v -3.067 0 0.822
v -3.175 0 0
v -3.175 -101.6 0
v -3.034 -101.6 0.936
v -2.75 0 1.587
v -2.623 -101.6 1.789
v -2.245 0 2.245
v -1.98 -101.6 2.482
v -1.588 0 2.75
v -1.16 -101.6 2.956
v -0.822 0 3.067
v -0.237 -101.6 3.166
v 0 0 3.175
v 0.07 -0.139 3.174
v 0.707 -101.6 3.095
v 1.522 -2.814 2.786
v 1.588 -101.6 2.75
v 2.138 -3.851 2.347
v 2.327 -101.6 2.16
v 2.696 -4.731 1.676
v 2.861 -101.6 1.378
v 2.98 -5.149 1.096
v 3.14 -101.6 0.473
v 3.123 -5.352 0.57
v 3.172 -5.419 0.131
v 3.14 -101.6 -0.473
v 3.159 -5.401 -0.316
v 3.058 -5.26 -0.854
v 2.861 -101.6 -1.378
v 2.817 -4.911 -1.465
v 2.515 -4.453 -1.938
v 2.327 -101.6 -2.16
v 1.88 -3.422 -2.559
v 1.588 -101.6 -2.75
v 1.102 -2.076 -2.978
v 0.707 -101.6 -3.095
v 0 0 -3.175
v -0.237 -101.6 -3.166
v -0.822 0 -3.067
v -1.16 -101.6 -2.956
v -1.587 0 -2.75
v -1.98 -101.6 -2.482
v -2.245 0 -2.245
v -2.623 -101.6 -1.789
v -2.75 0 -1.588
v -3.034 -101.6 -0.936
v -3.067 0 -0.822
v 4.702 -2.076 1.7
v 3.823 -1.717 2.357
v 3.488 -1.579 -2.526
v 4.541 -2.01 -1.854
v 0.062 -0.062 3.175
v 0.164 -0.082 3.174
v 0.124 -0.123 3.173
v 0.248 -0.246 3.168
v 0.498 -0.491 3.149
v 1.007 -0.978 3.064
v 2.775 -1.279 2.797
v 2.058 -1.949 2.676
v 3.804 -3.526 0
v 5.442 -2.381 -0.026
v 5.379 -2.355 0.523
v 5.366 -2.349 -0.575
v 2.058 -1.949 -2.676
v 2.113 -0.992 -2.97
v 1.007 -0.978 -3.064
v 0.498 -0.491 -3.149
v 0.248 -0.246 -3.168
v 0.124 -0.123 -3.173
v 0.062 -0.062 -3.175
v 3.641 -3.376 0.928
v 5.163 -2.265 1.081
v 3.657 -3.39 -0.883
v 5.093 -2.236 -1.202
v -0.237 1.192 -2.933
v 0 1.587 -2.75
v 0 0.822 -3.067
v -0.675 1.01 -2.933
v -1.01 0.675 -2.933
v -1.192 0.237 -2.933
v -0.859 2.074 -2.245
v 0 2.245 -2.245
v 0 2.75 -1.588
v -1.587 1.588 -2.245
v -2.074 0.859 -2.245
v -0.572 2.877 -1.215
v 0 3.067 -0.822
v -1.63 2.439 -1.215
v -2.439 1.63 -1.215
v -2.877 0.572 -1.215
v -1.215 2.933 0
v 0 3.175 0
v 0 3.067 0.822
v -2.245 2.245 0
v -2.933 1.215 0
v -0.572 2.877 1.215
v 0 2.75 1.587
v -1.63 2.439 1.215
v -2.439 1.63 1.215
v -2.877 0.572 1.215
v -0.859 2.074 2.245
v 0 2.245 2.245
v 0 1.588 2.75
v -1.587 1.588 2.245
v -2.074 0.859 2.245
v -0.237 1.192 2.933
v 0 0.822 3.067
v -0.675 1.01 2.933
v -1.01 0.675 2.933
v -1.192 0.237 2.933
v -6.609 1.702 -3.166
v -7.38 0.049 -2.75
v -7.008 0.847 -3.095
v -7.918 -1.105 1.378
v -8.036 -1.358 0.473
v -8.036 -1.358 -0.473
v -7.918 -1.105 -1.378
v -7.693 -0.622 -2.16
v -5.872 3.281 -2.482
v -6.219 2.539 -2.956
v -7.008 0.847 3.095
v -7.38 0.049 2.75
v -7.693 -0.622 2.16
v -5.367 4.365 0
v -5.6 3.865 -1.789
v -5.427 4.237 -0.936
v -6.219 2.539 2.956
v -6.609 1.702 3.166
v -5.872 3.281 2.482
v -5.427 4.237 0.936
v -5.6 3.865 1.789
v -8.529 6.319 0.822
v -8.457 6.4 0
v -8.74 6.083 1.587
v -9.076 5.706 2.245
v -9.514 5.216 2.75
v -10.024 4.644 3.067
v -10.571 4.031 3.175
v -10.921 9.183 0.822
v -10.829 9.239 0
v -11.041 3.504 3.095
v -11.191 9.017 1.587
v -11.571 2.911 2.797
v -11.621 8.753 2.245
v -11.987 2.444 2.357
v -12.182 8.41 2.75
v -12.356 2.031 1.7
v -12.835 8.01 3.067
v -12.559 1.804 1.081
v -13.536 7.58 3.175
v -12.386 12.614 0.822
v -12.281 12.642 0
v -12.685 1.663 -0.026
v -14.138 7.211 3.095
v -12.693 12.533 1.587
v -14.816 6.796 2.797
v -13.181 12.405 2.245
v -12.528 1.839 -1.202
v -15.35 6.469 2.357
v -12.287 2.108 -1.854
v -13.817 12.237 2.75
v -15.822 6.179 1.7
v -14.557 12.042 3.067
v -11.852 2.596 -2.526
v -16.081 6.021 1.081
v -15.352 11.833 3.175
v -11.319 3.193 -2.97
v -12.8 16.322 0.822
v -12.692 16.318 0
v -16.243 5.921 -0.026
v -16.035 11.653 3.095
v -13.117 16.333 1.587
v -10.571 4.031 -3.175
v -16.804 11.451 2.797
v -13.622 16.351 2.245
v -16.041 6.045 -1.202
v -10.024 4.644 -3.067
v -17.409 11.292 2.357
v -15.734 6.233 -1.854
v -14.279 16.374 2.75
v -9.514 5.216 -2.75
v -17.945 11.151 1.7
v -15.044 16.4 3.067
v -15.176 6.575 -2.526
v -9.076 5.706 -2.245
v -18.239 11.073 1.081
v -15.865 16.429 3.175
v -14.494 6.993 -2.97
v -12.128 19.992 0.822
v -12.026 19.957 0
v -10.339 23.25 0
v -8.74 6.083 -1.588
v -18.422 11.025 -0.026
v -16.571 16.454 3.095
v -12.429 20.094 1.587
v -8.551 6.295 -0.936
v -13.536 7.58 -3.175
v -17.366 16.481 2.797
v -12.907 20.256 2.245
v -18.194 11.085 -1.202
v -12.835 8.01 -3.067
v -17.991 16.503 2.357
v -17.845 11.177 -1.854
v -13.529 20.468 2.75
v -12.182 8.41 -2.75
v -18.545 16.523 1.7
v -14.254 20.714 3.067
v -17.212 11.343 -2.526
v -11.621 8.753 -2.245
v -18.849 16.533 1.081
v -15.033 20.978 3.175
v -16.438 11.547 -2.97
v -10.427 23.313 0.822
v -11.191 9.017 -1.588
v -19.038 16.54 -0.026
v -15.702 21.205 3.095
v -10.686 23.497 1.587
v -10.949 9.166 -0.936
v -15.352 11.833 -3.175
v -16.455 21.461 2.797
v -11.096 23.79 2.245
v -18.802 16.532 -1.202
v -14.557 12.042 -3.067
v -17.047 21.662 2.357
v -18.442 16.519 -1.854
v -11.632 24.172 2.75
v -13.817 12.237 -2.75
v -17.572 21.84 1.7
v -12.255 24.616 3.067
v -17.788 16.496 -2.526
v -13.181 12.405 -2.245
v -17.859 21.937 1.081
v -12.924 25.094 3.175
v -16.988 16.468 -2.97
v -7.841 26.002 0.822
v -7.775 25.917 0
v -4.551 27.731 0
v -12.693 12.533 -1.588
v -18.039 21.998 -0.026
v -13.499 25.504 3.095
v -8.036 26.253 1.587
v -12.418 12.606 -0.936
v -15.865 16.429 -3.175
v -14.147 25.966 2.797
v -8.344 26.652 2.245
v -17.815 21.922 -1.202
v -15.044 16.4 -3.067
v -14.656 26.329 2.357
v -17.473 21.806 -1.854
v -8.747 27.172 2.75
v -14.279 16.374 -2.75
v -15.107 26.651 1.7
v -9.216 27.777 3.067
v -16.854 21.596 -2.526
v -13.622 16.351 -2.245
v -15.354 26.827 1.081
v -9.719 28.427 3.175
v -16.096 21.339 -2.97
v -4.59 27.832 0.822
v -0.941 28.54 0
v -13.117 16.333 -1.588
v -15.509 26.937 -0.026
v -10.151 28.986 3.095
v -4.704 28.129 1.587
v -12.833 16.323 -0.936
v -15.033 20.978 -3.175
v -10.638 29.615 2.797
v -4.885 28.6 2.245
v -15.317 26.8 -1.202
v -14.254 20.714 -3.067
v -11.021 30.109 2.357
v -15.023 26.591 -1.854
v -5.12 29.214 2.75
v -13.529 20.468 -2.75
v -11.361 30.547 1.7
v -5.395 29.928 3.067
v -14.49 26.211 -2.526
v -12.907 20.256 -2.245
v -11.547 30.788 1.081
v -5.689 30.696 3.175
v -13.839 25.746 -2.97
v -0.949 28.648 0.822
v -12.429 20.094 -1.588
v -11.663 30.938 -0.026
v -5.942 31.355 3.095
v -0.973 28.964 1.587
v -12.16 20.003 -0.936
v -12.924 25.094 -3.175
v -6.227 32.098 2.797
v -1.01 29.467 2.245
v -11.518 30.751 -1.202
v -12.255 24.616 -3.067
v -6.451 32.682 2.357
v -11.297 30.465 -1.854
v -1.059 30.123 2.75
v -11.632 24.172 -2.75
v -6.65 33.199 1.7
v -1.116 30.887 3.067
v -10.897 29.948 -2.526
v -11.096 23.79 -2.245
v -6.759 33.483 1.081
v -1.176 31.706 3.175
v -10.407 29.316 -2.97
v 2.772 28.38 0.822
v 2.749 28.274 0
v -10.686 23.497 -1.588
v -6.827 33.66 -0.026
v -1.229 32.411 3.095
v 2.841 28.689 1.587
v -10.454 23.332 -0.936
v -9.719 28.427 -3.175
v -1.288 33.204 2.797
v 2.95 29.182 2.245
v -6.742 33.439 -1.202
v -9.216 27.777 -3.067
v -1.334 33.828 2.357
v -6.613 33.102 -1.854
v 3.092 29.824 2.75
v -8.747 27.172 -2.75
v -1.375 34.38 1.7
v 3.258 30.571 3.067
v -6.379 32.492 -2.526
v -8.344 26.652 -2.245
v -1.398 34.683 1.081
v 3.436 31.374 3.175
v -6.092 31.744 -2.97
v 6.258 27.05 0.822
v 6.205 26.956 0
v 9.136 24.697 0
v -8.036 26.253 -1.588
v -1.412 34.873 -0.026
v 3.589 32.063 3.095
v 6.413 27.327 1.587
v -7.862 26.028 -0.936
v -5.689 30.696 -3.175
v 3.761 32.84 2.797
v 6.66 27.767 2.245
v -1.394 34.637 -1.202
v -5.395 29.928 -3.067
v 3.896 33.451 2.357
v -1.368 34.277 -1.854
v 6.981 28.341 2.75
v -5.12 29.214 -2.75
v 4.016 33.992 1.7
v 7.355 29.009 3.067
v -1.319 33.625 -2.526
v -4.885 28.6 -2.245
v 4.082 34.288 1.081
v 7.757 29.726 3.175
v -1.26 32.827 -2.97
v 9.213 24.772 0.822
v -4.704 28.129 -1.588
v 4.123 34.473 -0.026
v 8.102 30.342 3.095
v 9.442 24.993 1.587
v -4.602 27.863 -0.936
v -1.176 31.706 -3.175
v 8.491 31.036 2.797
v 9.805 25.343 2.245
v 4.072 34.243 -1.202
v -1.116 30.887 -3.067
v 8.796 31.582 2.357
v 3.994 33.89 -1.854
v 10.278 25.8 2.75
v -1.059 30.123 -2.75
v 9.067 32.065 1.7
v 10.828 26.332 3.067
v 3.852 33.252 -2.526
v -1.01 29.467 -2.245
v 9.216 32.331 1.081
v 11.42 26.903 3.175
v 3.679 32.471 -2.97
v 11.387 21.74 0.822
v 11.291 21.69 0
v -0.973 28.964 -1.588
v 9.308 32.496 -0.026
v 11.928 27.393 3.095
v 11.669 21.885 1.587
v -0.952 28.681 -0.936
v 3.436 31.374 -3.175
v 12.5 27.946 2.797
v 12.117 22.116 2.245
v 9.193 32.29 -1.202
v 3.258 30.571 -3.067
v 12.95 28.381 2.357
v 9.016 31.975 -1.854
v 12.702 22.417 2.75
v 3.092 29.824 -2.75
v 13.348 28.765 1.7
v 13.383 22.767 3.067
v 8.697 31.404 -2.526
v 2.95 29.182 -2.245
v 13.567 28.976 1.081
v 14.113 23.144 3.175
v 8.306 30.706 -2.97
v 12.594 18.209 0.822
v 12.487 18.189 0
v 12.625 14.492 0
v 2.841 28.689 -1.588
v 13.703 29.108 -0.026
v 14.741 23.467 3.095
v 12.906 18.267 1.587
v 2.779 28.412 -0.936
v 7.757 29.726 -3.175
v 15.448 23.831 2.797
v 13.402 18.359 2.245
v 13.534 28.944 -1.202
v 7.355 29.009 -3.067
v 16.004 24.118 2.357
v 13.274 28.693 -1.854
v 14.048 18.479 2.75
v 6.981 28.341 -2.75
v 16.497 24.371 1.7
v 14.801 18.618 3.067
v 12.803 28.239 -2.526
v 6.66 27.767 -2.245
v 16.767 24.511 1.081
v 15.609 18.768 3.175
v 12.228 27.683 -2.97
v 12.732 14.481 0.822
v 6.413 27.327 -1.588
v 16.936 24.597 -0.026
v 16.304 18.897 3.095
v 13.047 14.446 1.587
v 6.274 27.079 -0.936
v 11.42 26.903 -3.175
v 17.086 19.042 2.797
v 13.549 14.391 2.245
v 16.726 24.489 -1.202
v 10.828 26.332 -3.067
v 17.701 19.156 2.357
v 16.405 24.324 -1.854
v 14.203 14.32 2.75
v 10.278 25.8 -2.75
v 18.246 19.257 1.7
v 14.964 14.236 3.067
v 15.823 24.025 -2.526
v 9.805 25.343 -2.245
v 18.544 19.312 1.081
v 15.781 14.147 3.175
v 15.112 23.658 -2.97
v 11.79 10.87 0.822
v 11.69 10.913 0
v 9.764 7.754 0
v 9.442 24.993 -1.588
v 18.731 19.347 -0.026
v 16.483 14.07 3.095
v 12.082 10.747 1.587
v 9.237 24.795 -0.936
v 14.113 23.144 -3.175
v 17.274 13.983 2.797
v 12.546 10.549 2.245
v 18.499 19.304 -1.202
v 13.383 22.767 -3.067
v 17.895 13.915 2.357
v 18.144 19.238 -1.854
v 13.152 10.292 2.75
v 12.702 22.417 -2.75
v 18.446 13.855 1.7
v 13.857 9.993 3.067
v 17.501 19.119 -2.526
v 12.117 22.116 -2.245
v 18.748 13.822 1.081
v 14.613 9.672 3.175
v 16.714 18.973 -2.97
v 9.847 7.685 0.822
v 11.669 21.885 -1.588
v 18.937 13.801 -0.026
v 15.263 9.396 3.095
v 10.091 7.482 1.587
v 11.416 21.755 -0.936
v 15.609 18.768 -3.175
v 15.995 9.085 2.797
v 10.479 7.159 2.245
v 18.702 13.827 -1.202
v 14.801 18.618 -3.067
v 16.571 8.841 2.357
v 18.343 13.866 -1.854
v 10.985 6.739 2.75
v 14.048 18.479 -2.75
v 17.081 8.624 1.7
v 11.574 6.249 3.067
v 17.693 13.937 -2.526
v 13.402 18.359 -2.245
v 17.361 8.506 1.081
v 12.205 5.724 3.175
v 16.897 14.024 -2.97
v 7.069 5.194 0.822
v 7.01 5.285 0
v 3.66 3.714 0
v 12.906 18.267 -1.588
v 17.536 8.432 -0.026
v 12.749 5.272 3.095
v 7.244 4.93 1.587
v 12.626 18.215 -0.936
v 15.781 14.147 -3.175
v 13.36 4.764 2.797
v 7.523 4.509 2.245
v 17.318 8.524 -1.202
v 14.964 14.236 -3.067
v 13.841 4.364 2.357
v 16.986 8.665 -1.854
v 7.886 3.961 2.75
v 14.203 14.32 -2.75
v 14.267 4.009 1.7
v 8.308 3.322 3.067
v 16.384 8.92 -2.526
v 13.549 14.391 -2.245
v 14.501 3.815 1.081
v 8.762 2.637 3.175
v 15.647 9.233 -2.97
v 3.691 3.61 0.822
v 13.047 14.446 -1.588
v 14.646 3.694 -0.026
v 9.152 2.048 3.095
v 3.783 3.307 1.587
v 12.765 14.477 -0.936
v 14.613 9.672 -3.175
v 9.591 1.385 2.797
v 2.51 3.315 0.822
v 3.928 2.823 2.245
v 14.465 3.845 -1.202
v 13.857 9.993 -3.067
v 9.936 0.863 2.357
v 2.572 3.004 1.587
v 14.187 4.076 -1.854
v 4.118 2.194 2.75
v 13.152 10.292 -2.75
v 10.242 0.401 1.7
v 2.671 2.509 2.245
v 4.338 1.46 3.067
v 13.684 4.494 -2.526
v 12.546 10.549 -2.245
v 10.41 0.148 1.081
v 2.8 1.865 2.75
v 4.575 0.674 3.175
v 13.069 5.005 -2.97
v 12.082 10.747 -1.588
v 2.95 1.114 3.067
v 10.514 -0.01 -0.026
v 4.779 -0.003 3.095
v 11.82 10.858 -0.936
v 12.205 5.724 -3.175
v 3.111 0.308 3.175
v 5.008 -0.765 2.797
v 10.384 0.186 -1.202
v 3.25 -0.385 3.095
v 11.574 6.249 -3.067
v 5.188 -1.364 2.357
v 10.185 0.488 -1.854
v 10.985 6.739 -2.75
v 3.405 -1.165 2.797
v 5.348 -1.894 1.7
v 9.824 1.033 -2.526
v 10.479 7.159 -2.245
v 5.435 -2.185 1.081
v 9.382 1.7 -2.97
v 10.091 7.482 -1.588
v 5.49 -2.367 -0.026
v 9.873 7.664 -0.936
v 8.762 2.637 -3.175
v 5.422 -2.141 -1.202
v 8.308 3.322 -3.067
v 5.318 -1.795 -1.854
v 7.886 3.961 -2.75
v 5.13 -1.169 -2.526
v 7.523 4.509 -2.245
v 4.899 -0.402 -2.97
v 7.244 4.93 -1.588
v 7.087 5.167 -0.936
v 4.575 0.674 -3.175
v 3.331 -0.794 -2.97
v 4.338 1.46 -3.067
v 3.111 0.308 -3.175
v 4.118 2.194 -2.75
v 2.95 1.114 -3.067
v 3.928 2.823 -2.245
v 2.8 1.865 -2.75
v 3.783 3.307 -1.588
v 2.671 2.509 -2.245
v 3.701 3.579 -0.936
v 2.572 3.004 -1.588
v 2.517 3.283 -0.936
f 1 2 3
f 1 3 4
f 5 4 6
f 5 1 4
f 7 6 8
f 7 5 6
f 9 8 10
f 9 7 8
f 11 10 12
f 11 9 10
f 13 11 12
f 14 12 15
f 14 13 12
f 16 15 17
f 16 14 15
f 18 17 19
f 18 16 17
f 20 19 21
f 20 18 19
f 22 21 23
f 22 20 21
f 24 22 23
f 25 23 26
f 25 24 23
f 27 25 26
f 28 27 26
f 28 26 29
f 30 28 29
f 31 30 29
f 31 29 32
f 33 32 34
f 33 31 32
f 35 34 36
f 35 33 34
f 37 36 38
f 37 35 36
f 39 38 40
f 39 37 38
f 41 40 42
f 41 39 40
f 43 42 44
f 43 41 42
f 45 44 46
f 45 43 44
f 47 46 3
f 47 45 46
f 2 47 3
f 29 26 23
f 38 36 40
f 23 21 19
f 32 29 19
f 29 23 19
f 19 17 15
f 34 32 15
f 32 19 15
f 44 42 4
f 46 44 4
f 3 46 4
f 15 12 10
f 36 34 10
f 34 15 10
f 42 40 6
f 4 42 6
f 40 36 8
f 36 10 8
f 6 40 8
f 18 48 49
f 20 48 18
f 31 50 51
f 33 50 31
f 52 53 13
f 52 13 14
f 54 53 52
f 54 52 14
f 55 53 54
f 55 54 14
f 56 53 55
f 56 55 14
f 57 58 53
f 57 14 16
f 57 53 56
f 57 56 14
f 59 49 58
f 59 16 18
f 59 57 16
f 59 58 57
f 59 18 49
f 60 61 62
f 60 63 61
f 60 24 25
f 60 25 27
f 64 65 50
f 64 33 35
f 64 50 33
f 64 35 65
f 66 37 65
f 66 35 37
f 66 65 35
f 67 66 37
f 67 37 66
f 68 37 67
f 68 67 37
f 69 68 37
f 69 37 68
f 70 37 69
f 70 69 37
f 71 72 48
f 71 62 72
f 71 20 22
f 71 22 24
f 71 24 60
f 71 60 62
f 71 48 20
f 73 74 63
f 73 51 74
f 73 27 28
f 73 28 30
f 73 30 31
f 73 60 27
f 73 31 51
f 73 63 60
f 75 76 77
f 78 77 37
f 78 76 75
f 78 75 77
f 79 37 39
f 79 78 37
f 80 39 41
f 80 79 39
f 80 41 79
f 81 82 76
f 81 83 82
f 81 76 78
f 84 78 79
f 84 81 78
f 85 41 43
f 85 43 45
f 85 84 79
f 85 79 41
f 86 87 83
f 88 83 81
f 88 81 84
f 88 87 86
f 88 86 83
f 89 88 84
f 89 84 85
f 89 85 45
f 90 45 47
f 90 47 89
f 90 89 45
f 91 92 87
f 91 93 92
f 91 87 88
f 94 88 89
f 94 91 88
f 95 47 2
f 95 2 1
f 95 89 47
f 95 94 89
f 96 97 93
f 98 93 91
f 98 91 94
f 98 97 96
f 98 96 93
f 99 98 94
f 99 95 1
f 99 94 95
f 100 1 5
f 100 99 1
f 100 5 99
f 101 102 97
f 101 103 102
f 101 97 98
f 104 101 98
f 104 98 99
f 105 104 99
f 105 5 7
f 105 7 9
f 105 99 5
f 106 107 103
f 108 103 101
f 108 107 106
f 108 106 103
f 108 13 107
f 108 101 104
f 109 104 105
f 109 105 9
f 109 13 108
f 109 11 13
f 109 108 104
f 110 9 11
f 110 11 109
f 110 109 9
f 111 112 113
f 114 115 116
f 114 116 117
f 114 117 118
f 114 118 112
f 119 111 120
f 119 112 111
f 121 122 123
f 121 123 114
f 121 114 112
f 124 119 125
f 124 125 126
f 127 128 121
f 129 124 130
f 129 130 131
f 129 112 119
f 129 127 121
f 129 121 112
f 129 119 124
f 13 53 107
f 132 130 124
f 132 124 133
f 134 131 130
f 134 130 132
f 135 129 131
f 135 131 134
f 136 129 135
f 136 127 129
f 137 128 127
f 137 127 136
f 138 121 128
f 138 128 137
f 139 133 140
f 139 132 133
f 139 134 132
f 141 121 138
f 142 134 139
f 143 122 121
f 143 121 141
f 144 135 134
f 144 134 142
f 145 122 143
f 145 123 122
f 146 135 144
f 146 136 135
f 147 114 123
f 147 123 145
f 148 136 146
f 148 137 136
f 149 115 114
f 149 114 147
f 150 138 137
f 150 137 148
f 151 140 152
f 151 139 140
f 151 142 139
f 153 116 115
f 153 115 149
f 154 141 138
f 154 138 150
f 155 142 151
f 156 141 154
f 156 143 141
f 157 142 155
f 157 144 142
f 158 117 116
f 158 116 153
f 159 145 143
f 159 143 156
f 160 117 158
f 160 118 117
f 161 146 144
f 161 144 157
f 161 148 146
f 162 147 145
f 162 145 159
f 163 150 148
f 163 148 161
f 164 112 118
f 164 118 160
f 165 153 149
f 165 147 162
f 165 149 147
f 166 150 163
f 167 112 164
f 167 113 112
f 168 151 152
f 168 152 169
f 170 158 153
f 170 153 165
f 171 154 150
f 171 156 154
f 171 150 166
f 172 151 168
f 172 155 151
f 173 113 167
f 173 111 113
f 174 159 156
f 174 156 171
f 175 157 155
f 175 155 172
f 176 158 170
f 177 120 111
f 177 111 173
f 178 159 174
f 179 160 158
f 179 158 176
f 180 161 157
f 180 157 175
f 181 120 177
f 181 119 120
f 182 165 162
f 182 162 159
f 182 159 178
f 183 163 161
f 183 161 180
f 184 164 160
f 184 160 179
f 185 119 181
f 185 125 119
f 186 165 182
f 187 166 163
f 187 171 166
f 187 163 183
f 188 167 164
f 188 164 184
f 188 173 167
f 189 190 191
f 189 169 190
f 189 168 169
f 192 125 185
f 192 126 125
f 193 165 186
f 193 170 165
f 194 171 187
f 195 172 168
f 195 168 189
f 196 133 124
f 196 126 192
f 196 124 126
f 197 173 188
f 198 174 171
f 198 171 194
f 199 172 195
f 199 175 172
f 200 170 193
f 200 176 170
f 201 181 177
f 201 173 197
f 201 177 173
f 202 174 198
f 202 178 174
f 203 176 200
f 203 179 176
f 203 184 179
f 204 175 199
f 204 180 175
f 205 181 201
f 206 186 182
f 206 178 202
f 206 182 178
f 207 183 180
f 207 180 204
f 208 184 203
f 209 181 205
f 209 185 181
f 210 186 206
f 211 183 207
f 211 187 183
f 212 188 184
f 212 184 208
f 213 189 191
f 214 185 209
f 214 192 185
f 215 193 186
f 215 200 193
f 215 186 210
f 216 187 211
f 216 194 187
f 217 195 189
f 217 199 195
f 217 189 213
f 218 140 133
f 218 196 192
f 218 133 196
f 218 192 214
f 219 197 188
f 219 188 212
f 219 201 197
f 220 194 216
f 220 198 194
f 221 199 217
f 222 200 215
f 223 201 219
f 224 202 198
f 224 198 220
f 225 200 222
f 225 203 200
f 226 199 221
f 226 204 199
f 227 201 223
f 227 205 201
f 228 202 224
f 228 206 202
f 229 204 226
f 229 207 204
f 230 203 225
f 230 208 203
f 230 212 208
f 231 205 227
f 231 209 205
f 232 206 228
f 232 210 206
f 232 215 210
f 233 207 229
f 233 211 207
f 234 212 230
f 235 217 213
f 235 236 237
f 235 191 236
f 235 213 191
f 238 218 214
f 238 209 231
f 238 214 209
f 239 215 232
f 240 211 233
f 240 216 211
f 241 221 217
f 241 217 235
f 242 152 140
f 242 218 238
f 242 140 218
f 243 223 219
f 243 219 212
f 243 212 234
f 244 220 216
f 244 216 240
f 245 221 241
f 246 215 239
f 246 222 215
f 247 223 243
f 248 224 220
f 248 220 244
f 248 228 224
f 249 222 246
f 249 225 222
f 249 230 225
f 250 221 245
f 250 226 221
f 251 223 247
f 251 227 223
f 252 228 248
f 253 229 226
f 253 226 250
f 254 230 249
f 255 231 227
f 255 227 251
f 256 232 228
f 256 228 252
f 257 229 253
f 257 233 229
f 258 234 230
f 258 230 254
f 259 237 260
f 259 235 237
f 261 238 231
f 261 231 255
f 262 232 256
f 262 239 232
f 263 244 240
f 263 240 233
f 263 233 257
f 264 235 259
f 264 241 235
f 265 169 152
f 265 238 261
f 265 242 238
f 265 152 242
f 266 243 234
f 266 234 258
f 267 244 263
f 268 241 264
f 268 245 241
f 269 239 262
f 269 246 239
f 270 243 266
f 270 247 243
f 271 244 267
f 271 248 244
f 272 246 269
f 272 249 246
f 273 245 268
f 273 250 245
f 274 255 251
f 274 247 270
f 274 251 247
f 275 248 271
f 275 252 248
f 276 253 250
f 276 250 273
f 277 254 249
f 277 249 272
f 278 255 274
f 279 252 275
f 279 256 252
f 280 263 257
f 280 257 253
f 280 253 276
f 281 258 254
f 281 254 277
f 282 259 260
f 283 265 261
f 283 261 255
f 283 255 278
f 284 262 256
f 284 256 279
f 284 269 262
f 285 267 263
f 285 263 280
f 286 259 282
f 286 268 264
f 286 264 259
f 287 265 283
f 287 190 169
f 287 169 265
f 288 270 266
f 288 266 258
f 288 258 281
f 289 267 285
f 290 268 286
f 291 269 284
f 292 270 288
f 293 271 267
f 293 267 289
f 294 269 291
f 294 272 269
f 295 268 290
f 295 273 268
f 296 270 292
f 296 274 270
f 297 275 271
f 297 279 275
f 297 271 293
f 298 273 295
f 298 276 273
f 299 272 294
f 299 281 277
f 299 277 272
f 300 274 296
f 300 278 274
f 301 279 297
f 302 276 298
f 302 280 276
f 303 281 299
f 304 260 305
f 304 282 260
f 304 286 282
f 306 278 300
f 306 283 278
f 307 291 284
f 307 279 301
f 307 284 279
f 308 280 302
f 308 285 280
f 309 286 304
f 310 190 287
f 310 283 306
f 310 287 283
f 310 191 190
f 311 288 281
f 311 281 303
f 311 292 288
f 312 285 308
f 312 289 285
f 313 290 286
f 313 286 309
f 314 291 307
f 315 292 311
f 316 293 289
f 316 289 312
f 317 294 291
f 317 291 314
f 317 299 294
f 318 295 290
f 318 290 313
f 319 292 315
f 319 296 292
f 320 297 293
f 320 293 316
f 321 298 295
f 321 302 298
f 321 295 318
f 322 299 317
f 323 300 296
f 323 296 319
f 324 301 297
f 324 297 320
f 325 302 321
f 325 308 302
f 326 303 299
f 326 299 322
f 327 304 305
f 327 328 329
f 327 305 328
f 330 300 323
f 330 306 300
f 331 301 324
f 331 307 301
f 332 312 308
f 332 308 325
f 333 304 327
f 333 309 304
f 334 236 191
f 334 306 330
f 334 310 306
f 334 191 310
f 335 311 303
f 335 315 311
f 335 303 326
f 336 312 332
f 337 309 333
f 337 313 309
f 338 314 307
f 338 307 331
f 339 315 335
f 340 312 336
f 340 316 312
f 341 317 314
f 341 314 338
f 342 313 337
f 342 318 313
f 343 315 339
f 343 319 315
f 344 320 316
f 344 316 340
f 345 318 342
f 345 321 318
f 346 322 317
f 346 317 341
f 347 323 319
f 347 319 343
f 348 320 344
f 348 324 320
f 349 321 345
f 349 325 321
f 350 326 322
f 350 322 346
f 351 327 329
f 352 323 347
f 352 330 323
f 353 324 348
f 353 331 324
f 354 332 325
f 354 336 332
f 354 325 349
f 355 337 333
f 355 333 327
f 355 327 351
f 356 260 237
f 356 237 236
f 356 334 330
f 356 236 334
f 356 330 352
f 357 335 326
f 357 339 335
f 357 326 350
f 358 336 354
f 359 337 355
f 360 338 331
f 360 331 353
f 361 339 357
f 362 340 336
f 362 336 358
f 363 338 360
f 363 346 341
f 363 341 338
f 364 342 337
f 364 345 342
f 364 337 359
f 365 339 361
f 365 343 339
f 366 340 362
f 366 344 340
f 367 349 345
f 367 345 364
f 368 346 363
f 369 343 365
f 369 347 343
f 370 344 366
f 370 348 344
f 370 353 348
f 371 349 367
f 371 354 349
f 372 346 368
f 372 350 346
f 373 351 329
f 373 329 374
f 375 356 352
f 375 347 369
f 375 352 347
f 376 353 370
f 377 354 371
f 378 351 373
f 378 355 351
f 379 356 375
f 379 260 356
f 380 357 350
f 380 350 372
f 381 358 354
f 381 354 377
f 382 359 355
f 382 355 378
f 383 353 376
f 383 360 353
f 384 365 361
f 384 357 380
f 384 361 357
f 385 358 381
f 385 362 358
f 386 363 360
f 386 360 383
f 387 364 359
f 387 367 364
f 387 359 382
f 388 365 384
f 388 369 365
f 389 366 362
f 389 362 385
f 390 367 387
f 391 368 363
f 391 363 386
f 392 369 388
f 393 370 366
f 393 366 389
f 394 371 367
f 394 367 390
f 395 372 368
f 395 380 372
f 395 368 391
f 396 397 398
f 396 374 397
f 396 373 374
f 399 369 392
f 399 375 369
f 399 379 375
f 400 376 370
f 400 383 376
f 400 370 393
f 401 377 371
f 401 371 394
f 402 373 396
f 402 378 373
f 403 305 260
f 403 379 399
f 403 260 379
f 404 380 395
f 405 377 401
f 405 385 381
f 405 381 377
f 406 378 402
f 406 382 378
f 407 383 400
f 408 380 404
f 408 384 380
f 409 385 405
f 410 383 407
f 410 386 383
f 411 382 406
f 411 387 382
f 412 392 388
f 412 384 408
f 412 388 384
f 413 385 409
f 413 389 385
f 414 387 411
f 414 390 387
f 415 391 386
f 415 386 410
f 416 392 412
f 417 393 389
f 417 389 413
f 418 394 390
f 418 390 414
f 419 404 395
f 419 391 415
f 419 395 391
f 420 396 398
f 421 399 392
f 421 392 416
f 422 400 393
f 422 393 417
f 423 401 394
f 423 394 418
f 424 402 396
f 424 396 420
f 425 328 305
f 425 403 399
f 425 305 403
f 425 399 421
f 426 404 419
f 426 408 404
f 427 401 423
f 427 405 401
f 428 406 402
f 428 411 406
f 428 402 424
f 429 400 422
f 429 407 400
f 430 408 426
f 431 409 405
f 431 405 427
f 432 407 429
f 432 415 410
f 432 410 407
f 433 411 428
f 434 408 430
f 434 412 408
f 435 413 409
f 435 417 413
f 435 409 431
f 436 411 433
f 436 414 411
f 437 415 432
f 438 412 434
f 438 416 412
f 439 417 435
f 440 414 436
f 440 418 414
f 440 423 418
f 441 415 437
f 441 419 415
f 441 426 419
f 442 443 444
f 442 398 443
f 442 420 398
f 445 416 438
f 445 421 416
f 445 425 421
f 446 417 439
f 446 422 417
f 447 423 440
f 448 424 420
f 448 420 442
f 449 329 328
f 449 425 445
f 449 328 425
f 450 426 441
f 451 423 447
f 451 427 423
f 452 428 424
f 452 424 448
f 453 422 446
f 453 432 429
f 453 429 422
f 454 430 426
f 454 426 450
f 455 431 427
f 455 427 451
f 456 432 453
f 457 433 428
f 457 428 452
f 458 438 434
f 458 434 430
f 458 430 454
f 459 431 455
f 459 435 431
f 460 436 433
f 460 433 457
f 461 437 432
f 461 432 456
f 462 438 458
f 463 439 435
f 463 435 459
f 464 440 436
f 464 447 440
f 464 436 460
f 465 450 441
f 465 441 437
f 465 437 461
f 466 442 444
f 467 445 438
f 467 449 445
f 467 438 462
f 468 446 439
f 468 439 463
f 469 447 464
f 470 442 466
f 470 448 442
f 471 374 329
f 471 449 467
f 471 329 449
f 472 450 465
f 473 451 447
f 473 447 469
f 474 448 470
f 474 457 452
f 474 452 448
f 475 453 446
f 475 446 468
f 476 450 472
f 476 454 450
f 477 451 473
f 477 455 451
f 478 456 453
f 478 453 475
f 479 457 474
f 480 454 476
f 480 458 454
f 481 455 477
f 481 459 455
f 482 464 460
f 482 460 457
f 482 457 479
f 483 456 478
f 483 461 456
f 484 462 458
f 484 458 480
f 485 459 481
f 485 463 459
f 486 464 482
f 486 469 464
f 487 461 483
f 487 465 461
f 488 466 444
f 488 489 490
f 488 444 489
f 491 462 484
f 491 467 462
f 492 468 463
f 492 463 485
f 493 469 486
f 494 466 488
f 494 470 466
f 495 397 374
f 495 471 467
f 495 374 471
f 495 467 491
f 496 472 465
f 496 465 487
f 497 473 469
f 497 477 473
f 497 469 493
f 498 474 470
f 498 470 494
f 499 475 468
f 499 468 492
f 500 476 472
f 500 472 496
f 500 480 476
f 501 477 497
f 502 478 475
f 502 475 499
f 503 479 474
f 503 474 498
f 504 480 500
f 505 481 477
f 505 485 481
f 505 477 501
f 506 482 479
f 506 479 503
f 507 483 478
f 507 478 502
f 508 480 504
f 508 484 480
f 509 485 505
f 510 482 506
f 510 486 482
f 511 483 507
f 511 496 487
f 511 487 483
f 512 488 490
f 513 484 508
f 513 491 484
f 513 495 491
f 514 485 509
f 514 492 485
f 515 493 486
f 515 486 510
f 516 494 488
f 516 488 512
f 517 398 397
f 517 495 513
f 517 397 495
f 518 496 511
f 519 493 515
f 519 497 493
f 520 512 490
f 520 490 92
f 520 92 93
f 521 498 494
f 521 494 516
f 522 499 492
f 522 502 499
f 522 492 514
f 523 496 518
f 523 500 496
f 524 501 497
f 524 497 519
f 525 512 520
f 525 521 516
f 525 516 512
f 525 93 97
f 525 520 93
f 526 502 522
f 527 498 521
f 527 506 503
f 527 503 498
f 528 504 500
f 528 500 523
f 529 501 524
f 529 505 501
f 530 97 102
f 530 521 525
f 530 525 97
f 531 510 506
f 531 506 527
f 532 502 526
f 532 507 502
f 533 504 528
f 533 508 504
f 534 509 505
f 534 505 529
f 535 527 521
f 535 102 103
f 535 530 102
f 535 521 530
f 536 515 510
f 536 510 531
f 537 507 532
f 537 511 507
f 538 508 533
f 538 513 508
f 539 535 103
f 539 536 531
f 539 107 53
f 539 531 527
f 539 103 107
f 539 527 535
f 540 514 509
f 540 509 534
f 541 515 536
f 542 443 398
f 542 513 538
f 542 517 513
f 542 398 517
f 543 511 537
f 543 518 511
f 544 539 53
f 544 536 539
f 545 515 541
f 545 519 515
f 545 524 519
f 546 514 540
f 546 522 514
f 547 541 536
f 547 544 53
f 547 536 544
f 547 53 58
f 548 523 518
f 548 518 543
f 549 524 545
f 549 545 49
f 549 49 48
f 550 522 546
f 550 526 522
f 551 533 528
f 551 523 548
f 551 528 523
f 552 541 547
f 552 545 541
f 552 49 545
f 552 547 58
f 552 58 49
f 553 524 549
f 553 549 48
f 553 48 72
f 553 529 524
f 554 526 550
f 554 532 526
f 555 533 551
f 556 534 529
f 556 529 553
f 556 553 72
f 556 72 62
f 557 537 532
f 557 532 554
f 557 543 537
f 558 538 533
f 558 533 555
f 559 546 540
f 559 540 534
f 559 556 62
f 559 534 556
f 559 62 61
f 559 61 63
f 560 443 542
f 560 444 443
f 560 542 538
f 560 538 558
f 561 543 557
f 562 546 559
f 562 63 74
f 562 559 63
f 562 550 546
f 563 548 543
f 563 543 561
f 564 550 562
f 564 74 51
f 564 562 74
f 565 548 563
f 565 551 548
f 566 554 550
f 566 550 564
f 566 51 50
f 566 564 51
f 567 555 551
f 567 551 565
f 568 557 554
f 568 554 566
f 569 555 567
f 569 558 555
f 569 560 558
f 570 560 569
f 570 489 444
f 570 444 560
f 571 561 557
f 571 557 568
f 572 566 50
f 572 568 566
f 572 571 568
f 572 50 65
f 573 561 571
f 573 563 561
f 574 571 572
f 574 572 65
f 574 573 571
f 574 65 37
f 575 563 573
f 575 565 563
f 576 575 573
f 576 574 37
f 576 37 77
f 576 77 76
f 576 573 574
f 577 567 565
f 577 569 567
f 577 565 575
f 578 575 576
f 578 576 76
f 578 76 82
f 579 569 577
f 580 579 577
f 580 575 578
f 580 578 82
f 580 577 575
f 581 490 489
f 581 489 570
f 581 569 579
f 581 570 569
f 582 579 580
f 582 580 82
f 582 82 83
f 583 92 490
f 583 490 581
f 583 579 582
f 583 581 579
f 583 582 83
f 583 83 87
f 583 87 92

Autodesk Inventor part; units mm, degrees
ref_plane "YZ Plane" through (0, 0, 0) normal (1, 0, 0) x (0, 1, 0)
ref_plane "XZ Plane" through (0, 0, 0) normal (0, 1, 0) x (-1, 0, 0)
ref_plane "XY Plane" through (0, 0, 0) normal (0, 0, 1) x (1, 0, 0)
sketch "Sketch1" plane through (0, 0, 0) normal (1, 0, 0) x (0, 1, 0)
  circle A0 centre (0, 0) radius 3.175
  line L0 (3.175, 0) -> (15.875, 0)
  line L1 (15.875, 0) -> (15.875, 11.0604)
  dimension "d0" = 6.35
  dimension "d1" = 12.7
revolve "Revolution1" add sketch "Sketch1" angle 335 about axis through (0, 15.875, 0) along (0, 0, 1)
sketch "Sketch2" plane through (0, 0, 0) normal (0, 1, 0) x (-1, 0, 0)
  circle A0 centre (0, 0) radius 3.175
  line L0 (15.875, -3.175) -> (-15.875, -3.175) projected
extrude "Extrusion1" add sketch "Sketch2" against normal blind 101.6
sketch "Sketch3" plane through (0, 0, 0) normal (0, 1, 0) x (1, 0, 0)
  line L0 (0, 3.175) -> (0, -3.175) projected
  arc A0 (0, 3.175) -> (0, -3.175) centre (0, 0) ccw projected
revolve "Revolution2" add sketch "Sketch3" angle 360 about axis through (0, 0, -3.175) along (0, 0, 1)
fillet "Fillet1" radius 3.175 1 edges at (3.175, -2.9086, 0)
thread "Thread1" size "1/4-20 UNC" class "2A" standard "ANSI Unified Screw Threads" full length
properties part number "EyeBolt"
